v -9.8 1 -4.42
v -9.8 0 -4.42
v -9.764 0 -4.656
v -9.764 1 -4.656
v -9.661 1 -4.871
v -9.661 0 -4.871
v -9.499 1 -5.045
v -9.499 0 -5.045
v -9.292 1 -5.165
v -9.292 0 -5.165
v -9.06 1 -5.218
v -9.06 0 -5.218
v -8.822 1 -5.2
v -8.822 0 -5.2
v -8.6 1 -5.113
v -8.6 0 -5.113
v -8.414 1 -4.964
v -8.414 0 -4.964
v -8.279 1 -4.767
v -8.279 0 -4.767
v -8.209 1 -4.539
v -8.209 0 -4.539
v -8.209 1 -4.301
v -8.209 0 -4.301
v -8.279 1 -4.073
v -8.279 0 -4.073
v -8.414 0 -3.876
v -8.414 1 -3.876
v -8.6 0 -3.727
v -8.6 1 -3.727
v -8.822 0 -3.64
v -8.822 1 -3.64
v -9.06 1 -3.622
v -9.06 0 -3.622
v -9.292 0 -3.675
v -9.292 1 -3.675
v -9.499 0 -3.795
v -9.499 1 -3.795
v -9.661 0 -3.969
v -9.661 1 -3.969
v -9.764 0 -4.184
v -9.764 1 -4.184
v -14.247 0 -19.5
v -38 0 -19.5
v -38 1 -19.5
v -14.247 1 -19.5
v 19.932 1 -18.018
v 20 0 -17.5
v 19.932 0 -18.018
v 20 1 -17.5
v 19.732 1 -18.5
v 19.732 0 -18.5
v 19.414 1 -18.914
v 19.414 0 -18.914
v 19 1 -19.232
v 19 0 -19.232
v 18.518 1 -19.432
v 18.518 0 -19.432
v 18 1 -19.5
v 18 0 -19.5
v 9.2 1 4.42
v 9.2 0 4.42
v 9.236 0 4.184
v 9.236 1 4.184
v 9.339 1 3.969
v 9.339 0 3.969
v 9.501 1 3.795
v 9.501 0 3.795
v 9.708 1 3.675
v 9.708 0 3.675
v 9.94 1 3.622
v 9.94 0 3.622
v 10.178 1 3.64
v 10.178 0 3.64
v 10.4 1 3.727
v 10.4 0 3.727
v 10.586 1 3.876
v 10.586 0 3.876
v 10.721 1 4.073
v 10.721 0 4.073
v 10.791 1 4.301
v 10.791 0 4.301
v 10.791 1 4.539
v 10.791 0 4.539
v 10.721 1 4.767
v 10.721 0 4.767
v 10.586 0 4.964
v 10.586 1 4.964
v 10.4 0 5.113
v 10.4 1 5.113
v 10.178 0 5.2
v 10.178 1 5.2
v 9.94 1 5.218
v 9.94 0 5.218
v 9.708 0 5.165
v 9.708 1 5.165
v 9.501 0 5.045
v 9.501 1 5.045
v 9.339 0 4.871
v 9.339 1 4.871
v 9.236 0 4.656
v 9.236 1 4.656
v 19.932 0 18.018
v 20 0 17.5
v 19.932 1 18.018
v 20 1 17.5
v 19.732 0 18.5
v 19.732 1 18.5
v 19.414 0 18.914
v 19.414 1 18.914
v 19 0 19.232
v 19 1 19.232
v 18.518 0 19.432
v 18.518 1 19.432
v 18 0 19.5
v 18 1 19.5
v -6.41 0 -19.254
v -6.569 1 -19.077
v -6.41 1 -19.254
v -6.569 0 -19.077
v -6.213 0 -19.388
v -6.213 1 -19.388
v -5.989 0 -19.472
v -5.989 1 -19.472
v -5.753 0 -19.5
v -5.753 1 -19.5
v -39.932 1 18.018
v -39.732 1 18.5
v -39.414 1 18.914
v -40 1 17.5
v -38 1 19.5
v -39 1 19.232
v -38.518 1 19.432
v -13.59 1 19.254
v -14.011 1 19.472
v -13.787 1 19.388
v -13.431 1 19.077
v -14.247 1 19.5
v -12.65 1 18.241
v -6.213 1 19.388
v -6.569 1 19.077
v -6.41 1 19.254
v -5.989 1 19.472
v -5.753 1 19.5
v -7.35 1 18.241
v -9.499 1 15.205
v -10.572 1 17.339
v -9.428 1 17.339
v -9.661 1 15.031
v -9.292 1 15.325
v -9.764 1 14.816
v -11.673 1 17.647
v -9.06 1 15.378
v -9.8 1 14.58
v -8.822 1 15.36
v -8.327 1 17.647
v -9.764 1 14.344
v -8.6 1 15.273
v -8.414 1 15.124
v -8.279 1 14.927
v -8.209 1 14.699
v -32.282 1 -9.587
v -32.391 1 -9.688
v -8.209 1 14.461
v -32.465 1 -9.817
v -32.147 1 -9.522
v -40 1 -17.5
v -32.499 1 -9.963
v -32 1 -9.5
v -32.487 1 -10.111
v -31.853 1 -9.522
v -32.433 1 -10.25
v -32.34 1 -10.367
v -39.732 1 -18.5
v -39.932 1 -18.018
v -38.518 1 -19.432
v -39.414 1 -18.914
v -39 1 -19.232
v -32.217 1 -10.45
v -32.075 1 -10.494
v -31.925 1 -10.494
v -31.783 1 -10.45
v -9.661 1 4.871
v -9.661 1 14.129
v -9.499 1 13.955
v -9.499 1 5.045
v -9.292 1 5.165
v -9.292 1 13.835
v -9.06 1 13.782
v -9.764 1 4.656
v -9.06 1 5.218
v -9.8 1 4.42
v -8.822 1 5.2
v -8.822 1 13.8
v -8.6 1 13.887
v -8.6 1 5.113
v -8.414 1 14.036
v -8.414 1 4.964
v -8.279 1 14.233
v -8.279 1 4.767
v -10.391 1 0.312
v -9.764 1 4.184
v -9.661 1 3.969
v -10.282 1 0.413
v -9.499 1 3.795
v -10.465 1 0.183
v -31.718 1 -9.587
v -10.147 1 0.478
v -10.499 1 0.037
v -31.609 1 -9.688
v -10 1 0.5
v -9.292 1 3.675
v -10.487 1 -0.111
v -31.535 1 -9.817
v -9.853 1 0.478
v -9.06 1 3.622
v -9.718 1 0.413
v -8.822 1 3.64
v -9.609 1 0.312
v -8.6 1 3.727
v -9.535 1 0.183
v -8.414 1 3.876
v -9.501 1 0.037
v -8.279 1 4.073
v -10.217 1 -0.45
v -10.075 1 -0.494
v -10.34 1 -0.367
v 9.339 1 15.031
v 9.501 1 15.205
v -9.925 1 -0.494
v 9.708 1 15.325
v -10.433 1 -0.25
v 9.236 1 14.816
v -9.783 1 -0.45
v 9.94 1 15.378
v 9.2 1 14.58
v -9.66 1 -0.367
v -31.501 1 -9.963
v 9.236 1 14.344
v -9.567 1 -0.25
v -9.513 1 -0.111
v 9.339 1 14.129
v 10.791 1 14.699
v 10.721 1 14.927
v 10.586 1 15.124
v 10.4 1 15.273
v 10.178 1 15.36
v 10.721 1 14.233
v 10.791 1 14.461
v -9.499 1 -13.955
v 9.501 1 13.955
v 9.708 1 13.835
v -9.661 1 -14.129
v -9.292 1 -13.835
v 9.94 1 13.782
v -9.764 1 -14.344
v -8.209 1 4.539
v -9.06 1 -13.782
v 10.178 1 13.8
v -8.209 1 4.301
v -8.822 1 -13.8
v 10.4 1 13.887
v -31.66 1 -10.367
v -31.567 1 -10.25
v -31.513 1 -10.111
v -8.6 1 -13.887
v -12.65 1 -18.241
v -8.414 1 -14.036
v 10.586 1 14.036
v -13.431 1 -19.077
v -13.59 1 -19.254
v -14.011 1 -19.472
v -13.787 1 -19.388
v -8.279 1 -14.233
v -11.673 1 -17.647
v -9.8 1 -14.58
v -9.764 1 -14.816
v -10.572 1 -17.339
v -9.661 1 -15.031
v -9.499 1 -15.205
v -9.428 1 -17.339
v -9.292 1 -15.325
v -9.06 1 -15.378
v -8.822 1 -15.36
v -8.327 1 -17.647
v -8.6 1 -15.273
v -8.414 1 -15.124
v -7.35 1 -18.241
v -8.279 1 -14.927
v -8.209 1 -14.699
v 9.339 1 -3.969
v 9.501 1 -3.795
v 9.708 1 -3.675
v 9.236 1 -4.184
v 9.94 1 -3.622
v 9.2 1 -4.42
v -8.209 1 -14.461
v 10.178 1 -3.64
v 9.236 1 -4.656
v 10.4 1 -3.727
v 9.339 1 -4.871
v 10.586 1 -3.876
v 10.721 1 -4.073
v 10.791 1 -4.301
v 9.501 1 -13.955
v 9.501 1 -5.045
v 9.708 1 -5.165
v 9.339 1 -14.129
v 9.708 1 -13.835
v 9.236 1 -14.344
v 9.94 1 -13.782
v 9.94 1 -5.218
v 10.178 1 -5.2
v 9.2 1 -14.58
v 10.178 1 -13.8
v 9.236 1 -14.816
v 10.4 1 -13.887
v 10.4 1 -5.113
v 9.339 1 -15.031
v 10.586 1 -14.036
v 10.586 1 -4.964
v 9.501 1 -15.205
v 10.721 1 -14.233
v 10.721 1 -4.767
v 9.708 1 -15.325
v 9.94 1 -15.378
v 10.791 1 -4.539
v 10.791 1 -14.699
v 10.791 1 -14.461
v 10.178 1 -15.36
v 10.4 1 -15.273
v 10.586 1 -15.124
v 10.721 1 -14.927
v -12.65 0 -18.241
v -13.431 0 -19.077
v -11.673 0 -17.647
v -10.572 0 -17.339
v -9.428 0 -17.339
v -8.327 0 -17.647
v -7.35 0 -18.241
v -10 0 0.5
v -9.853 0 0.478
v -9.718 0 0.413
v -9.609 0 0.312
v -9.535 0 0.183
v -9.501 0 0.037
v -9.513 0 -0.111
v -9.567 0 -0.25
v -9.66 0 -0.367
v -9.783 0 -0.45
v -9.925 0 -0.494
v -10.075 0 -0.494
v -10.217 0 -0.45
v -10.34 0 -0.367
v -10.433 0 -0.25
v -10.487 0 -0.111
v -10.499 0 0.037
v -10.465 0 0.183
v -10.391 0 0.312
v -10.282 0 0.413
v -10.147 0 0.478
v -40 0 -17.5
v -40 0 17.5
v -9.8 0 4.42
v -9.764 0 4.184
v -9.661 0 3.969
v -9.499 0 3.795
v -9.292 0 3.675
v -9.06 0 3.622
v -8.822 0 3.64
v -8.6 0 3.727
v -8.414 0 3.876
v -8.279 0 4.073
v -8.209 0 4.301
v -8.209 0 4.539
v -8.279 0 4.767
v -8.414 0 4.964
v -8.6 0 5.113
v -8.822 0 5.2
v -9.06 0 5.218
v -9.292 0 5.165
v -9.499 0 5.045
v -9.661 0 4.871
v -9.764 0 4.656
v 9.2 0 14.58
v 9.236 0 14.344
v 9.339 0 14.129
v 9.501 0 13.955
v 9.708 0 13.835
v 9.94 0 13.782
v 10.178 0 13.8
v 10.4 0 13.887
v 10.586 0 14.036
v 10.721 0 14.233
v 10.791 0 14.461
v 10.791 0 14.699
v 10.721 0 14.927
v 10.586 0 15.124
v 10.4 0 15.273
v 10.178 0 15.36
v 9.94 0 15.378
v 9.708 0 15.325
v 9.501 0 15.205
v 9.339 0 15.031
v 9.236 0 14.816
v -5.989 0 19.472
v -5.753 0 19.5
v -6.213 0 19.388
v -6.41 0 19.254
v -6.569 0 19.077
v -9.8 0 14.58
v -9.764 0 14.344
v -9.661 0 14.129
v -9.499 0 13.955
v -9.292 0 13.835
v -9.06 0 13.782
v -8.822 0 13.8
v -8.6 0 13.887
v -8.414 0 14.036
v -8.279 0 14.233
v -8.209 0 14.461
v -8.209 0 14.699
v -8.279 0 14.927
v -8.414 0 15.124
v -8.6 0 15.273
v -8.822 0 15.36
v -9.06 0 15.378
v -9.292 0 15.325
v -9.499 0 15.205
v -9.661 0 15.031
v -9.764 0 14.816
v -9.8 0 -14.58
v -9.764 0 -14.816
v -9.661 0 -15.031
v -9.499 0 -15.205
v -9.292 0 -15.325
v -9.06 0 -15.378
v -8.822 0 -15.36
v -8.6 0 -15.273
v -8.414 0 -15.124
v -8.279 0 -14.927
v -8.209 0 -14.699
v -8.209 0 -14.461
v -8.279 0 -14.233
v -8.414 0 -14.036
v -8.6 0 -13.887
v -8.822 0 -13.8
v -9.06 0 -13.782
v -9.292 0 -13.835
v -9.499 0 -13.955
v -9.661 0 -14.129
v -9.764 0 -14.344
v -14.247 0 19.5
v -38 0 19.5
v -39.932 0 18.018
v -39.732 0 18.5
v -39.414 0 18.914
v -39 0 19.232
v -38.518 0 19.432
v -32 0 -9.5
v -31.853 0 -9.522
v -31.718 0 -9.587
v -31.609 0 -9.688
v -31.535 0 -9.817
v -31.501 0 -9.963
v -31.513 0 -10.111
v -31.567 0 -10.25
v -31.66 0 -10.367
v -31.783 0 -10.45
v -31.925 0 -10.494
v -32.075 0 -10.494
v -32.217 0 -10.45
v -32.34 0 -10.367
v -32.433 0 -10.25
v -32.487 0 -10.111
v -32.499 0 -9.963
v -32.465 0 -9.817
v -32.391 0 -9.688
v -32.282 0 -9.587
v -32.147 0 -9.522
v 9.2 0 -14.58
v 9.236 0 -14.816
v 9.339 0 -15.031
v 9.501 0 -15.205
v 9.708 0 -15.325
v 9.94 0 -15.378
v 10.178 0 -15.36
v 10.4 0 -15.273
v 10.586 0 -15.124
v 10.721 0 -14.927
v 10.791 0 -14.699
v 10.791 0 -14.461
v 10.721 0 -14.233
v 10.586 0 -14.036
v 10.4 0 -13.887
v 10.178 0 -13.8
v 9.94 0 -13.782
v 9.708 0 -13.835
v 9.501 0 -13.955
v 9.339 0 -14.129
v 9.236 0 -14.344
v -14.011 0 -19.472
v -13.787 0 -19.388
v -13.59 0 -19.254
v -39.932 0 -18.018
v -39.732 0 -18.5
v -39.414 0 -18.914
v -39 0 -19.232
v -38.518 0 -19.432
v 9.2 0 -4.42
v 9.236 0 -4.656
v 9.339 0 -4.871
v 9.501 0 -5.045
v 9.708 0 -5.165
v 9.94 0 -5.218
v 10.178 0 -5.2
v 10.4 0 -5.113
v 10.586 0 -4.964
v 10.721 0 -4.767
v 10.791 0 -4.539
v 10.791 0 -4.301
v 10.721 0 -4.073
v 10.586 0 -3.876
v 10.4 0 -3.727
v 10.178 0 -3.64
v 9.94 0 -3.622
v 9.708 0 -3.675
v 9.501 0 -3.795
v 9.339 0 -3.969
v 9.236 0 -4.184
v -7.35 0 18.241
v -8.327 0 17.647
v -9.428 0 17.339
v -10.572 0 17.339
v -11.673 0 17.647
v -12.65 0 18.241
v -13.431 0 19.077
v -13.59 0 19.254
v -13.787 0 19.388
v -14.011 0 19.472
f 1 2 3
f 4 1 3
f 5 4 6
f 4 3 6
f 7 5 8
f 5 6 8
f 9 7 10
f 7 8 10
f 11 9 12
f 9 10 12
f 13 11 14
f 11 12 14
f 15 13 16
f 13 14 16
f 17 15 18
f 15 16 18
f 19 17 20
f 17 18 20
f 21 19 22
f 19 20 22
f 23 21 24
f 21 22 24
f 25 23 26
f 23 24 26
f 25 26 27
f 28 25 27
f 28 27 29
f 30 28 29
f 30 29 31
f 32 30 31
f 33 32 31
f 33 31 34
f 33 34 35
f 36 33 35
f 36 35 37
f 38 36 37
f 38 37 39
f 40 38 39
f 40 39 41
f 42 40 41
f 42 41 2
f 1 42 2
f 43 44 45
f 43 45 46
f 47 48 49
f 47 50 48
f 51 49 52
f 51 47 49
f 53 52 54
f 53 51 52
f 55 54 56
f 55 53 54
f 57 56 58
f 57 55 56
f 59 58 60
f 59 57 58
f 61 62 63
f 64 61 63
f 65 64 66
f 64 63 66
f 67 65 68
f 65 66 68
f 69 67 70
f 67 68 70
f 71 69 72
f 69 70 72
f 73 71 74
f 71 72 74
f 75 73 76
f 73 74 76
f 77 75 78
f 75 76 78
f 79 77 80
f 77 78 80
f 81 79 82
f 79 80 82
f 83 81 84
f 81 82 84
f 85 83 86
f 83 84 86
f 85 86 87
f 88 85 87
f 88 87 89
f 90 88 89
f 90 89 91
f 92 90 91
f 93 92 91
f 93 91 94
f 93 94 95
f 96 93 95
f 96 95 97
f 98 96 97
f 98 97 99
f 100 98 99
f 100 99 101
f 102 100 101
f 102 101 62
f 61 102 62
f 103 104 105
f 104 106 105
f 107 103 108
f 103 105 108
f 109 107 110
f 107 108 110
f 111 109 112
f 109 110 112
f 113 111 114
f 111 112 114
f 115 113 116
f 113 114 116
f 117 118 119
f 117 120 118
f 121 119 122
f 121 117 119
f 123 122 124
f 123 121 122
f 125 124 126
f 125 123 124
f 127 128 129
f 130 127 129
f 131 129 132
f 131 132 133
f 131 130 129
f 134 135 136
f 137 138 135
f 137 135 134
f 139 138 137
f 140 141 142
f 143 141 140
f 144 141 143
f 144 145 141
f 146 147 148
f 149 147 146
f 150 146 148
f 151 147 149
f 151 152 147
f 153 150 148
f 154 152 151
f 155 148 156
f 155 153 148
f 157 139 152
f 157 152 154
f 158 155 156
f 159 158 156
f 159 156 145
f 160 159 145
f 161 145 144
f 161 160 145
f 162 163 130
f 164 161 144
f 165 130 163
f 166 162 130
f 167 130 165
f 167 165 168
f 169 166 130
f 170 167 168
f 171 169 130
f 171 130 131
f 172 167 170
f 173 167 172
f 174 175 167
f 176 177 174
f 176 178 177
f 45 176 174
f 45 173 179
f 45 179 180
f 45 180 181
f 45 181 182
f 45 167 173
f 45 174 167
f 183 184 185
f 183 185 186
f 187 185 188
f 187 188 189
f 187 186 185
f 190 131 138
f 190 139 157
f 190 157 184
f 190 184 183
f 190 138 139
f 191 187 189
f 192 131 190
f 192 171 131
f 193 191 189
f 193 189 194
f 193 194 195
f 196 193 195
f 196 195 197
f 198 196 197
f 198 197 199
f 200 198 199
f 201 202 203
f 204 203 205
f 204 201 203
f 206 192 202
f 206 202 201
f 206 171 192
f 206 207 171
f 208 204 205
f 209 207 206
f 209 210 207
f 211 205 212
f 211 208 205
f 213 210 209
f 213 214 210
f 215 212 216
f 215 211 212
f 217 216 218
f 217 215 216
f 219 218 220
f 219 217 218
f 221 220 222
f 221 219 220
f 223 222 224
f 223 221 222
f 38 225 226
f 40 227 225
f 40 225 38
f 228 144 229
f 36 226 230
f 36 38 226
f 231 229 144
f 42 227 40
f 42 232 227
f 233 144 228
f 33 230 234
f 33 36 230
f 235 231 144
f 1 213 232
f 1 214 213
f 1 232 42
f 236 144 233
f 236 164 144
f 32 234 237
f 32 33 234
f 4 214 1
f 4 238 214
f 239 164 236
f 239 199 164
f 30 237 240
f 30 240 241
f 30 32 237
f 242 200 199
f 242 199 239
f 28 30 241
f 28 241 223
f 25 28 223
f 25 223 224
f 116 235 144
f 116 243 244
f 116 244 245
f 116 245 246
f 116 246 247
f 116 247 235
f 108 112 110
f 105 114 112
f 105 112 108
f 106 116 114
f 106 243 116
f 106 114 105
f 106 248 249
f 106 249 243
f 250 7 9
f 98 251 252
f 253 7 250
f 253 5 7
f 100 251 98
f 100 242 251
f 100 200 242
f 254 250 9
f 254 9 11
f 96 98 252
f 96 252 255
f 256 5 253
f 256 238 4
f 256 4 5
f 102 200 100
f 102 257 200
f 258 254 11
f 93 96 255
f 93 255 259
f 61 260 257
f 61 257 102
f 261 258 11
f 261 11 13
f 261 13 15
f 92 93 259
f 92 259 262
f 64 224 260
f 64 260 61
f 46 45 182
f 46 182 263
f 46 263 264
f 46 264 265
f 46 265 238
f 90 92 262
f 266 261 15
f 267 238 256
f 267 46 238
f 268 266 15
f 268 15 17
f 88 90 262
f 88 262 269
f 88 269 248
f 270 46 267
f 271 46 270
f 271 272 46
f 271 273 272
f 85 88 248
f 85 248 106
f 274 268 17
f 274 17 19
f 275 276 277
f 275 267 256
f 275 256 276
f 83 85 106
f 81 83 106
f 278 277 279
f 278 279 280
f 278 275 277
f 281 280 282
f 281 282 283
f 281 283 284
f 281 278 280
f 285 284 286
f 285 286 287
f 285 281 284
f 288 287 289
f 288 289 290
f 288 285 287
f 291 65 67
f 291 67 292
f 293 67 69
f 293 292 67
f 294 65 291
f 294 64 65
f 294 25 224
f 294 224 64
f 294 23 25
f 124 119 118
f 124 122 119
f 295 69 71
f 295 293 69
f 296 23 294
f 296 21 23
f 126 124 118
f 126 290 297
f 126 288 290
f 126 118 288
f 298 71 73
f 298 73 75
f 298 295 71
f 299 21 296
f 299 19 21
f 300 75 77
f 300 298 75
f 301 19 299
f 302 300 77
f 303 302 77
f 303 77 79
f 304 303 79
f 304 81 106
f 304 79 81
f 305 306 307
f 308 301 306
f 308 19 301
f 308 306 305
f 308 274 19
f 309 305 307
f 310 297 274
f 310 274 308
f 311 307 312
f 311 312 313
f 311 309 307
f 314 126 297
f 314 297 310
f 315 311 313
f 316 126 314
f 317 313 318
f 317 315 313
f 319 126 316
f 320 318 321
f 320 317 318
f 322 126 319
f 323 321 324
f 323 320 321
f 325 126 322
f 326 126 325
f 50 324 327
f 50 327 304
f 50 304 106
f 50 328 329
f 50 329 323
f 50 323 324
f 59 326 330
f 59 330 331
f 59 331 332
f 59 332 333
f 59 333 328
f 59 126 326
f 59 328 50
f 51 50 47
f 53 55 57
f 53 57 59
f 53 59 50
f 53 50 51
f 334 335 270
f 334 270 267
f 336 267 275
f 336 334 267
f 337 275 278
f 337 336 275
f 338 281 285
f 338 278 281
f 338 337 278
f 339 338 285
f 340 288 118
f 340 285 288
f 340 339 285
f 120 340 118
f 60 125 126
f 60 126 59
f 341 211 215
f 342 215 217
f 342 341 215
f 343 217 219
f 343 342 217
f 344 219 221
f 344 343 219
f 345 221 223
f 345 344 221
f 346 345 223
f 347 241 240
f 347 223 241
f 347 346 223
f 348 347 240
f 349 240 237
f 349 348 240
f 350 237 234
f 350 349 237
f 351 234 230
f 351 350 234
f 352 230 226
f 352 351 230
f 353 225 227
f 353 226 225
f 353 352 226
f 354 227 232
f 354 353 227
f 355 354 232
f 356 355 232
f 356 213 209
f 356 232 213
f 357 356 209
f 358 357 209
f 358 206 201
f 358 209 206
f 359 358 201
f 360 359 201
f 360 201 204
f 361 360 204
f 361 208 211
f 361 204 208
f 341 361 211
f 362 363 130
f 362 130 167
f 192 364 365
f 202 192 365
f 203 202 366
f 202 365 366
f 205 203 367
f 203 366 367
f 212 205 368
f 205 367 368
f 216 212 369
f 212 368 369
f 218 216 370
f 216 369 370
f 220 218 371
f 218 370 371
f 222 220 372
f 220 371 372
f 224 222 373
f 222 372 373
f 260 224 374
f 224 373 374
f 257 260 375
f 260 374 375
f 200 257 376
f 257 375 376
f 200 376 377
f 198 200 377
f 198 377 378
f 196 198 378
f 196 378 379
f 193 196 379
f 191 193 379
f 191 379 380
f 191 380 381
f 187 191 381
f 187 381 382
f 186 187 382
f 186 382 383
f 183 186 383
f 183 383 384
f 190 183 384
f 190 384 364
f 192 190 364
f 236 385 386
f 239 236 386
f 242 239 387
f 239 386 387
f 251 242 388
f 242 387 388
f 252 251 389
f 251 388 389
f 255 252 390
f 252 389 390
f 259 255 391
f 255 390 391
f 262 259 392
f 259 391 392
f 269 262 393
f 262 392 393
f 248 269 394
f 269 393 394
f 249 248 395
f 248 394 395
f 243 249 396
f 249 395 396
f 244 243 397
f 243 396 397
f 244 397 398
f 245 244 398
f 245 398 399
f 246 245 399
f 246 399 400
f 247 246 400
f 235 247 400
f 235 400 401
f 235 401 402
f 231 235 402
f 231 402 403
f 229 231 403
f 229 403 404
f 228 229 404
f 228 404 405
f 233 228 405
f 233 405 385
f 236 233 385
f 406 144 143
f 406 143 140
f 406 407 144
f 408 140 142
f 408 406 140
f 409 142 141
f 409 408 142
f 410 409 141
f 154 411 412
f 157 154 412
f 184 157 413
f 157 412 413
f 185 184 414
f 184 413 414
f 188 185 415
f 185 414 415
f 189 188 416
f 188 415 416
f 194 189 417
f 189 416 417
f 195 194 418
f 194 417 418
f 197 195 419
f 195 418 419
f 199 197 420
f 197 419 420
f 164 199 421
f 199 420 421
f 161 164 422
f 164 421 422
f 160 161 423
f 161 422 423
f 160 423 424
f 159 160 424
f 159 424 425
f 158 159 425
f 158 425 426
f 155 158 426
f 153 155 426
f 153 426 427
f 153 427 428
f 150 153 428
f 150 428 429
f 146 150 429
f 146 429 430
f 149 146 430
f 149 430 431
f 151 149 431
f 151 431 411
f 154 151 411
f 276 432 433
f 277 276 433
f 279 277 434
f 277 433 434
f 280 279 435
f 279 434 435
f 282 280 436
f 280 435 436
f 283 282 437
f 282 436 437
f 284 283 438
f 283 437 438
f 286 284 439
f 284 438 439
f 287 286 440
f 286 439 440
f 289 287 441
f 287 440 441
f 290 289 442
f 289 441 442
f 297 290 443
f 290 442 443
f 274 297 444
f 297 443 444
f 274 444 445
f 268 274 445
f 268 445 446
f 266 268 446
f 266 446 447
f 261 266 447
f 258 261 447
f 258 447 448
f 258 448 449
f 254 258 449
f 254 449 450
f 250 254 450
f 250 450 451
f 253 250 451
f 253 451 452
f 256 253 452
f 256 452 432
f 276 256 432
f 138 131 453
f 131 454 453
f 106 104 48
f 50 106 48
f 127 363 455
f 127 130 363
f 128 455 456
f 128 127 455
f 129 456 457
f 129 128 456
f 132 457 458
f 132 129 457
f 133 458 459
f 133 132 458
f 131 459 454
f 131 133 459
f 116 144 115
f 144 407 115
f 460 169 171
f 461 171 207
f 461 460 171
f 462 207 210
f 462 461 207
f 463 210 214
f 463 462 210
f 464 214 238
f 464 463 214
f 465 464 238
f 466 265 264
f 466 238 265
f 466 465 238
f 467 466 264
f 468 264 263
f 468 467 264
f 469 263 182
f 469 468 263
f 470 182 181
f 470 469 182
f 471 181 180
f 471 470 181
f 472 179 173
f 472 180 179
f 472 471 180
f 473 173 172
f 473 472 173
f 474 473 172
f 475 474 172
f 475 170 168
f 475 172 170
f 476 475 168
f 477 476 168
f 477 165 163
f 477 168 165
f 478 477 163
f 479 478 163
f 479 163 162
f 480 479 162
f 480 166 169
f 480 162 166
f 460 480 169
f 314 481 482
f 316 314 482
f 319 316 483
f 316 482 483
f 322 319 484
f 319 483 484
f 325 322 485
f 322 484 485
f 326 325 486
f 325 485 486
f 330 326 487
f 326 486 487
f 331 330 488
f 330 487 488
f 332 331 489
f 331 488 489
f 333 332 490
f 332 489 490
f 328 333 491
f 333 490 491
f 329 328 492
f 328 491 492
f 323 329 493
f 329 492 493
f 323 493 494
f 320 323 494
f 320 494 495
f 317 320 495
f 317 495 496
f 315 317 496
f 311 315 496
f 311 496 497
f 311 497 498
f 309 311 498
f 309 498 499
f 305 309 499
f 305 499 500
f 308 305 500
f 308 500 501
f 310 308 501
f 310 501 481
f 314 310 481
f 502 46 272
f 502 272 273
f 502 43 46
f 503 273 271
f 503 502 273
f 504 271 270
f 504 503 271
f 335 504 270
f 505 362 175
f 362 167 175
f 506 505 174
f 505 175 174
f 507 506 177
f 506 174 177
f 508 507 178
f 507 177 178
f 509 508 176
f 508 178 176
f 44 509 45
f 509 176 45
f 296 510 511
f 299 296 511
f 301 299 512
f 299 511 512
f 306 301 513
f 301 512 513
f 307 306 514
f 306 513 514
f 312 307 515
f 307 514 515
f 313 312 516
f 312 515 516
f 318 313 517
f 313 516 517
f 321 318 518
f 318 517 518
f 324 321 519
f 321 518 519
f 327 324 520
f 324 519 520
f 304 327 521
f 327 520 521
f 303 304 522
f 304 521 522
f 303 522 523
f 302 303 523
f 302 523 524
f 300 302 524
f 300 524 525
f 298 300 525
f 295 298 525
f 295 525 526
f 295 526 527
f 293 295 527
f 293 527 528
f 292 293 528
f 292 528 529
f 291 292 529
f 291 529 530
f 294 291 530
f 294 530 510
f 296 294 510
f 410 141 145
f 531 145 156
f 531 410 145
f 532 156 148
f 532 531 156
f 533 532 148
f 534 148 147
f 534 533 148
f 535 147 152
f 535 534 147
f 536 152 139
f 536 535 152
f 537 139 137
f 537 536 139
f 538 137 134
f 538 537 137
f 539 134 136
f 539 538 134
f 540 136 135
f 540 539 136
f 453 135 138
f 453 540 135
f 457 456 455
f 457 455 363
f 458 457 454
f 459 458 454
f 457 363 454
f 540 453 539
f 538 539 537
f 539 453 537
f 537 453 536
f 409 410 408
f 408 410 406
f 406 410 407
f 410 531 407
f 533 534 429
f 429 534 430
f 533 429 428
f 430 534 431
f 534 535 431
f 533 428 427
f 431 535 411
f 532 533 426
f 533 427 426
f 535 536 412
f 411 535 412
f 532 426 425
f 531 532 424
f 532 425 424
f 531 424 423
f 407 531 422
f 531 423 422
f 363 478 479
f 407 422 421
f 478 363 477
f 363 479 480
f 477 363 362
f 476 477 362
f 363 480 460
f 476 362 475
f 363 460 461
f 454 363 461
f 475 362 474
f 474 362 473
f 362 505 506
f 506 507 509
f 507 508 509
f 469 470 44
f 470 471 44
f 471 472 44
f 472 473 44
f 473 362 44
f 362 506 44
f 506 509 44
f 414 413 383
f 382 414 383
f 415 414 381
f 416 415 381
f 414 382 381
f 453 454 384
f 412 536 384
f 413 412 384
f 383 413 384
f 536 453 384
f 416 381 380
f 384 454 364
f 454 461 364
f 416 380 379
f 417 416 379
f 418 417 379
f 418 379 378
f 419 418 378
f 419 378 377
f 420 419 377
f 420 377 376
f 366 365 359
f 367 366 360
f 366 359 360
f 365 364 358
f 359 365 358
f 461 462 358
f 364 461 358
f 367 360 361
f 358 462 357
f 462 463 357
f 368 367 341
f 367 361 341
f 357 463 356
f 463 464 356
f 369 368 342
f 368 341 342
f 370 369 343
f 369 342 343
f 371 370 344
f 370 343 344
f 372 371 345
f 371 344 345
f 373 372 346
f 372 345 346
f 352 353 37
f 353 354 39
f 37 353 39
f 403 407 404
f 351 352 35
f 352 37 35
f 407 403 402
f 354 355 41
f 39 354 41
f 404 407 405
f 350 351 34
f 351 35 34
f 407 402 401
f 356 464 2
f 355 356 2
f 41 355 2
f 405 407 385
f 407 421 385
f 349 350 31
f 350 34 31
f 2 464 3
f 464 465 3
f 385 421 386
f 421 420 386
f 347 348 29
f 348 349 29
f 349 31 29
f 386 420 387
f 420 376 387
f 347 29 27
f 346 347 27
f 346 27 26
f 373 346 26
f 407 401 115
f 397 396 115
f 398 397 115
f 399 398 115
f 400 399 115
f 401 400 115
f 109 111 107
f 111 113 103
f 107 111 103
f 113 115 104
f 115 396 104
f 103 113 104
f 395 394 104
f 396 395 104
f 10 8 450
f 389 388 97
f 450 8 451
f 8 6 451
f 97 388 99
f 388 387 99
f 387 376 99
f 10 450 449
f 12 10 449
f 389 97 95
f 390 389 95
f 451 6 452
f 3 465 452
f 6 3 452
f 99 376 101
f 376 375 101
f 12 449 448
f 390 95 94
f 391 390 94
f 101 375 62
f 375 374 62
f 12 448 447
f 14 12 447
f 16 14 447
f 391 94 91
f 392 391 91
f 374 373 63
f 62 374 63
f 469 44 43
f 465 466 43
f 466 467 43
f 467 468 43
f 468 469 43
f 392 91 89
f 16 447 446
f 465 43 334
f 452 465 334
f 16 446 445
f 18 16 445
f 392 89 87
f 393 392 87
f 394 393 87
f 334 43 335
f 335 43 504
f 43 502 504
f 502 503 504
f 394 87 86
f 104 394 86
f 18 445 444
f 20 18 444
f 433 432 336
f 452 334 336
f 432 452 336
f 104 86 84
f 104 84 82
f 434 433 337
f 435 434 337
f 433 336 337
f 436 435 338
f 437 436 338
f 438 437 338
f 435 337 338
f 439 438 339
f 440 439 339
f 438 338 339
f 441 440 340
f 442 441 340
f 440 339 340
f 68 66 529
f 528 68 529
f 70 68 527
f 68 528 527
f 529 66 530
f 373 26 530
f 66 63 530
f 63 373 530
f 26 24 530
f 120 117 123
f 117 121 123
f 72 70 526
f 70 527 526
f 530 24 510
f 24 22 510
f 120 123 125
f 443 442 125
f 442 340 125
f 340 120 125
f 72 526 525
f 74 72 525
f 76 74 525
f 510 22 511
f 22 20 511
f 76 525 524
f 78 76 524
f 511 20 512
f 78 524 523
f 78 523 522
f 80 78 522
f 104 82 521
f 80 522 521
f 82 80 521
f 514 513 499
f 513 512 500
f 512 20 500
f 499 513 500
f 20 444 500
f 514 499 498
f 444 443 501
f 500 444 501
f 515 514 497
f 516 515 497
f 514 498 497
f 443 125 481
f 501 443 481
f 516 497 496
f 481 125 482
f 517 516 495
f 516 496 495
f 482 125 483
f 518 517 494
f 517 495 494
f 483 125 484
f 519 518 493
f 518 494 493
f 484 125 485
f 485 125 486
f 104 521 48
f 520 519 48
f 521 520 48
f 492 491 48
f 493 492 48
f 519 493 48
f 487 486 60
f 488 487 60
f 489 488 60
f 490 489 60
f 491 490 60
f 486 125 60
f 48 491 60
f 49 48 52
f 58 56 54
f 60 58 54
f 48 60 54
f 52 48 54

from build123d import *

# Parameters (mm, degrees)
SKETCH1_W                      = 40
SKETCH1_H                      = 39
BOSS_EXTRUDE1_DEPTH            = 1
SKETCH2_W                      = 20
SKETCH2_H                      = 39
BOSS_EXTRUDE2_DEPTH            = 1
FILLET1_R                      = 2
F_1_6_1_6_DIAMETER_HOLE1_D     = 1.6
F_1_6_1_6_DIAMETER_HOLE1_DEPTH = 19.77
F_1_6_1_6_DIAMETER_HOLE1_TIP   = 0.480688495
SKETCH11_R                     = 4.2
CUT_EXTRUDE1_DEPTH             = 7.4
FILLET2_R                      = 1
SKETCH12_R                     = 0.5
CUT_EXTRUDE2_DEPTH             = 10
SKETCH14_R                     = 0.5
CUT_EXTRUDE3_DEPTH             = 10


with BuildPart() as part:
    # Sketch1 → Boss-Extrude1 (new body)
    with BuildSketch(Plane(origin=(0, 0, 0), x_dir=(1, 0, 0), z_dir=(0, 1, 0))):
        Rectangle(SKETCH1_W, SKETCH1_H)
    extrude(amount=BOSS_EXTRUDE1_DEPTH)

    # Sketch2 → Boss-Extrude2 (add)
    with BuildSketch(Plane(origin=(0, 0, 0), x_dir=(1, 0, 0), z_dir=(0, 1, 0))):
        with Locations((-30, 0)):
            Rectangle(SKETCH2_W, SKETCH2_H)
    extrude(amount=BOSS_EXTRUDE2_DEPTH)

    # Fillet1
    fillet1_edges = [part.edges().sort_by_distance(p)[0] for p in [
        (-40, 0.5, -19.5),
        (-40, 0.5, 19.5),
        (20, 0.5, -19.5),
        (20, 0.5, 19.5),
    ]]
    fillet(fillet1_edges, radius=FILLET1_R)

    # Ø1.6 (1.6) Diameter Hole1
    with Locations(Plane(origin=(0, 1, 0), x_dir=(1, 0, 0), z_dir=(0, 1, 0))):
        with Locations((10, 14.58), (10, 4.42), (10, -4.42), (10, -14.58), (-9, -14.58), (-9, -4.42), (-9, 4.42), (-9, 14.58)):
            Hole(F_1_6_1_6_DIAMETER_HOLE1_D / 2, depth=F_1_6_1_6_DIAMETER_HOLE1_DEPTH)
            with Locations((0, 0, -(F_1_6_1_6_DIAMETER_HOLE1_DEPTH + F_1_6_1_6_DIAMETER_HOLE1_TIP / 2))):  # 118° drill point
                Cone(0, F_1_6_1_6_DIAMETER_HOLE1_D / 2, F_1_6_1_6_DIAMETER_HOLE1_TIP, mode=Mode.SUBTRACT)

    # Sketch11 → Cut-Extrude1 (cut)
    with BuildSketch(Plane(origin=(0, 0, 0), x_dir=(1, 0, 0), z_dir=(0, 1, 0))):
        with Locations((-10, -21.5)):
            Circle(SKETCH11_R)
        with Locations((-10, 21.5)):
            Circle(SKETCH11_R)
    extrude(amount=CUT_EXTRUDE1_DEPTH, mode=Mode.SUBTRACT)

    # Fillet2
    fillet2_edges = [part.edges().sort_by_distance(p)[0] for p in [
        (-6.306762937, 0.5, 19.5),
        (-13.693237063, 0.5, 19.5),
        (-13.693237063, 0.5, -19.5),
        (-6.306762937, 0.5, -19.5),
    ]]
    fillet(fillet2_edges, radius=FILLET2_R)

    # Sketch12 → Cut-Extrude2 (cut)
    with BuildSketch(Plane(origin=(0, 0, 0), x_dir=(1, 0, 0), z_dir=(0, 1, 0))):
        with Locations(Location((-32, 10, 0), (0, 0, 270))):
            Circle(SKETCH12_R)
    extrude(amount=CUT_EXTRUDE2_DEPTH, mode=Mode.SUBTRACT)

    # Sketch14 → Cut-Extrude3 (cut)
    with BuildSketch(Plane(origin=(0, 0, 0), x_dir=(1, 0, 0), z_dir=(0, 1, 0))):
        with Locations(Location((-10, 0, 0), (0, 0, 270))):
            Circle(SKETCH14_R)
    extrude(amount=CUT_EXTRUDE3_DEPTH, mode=Mode.SUBTRACT)


solid = part.part
